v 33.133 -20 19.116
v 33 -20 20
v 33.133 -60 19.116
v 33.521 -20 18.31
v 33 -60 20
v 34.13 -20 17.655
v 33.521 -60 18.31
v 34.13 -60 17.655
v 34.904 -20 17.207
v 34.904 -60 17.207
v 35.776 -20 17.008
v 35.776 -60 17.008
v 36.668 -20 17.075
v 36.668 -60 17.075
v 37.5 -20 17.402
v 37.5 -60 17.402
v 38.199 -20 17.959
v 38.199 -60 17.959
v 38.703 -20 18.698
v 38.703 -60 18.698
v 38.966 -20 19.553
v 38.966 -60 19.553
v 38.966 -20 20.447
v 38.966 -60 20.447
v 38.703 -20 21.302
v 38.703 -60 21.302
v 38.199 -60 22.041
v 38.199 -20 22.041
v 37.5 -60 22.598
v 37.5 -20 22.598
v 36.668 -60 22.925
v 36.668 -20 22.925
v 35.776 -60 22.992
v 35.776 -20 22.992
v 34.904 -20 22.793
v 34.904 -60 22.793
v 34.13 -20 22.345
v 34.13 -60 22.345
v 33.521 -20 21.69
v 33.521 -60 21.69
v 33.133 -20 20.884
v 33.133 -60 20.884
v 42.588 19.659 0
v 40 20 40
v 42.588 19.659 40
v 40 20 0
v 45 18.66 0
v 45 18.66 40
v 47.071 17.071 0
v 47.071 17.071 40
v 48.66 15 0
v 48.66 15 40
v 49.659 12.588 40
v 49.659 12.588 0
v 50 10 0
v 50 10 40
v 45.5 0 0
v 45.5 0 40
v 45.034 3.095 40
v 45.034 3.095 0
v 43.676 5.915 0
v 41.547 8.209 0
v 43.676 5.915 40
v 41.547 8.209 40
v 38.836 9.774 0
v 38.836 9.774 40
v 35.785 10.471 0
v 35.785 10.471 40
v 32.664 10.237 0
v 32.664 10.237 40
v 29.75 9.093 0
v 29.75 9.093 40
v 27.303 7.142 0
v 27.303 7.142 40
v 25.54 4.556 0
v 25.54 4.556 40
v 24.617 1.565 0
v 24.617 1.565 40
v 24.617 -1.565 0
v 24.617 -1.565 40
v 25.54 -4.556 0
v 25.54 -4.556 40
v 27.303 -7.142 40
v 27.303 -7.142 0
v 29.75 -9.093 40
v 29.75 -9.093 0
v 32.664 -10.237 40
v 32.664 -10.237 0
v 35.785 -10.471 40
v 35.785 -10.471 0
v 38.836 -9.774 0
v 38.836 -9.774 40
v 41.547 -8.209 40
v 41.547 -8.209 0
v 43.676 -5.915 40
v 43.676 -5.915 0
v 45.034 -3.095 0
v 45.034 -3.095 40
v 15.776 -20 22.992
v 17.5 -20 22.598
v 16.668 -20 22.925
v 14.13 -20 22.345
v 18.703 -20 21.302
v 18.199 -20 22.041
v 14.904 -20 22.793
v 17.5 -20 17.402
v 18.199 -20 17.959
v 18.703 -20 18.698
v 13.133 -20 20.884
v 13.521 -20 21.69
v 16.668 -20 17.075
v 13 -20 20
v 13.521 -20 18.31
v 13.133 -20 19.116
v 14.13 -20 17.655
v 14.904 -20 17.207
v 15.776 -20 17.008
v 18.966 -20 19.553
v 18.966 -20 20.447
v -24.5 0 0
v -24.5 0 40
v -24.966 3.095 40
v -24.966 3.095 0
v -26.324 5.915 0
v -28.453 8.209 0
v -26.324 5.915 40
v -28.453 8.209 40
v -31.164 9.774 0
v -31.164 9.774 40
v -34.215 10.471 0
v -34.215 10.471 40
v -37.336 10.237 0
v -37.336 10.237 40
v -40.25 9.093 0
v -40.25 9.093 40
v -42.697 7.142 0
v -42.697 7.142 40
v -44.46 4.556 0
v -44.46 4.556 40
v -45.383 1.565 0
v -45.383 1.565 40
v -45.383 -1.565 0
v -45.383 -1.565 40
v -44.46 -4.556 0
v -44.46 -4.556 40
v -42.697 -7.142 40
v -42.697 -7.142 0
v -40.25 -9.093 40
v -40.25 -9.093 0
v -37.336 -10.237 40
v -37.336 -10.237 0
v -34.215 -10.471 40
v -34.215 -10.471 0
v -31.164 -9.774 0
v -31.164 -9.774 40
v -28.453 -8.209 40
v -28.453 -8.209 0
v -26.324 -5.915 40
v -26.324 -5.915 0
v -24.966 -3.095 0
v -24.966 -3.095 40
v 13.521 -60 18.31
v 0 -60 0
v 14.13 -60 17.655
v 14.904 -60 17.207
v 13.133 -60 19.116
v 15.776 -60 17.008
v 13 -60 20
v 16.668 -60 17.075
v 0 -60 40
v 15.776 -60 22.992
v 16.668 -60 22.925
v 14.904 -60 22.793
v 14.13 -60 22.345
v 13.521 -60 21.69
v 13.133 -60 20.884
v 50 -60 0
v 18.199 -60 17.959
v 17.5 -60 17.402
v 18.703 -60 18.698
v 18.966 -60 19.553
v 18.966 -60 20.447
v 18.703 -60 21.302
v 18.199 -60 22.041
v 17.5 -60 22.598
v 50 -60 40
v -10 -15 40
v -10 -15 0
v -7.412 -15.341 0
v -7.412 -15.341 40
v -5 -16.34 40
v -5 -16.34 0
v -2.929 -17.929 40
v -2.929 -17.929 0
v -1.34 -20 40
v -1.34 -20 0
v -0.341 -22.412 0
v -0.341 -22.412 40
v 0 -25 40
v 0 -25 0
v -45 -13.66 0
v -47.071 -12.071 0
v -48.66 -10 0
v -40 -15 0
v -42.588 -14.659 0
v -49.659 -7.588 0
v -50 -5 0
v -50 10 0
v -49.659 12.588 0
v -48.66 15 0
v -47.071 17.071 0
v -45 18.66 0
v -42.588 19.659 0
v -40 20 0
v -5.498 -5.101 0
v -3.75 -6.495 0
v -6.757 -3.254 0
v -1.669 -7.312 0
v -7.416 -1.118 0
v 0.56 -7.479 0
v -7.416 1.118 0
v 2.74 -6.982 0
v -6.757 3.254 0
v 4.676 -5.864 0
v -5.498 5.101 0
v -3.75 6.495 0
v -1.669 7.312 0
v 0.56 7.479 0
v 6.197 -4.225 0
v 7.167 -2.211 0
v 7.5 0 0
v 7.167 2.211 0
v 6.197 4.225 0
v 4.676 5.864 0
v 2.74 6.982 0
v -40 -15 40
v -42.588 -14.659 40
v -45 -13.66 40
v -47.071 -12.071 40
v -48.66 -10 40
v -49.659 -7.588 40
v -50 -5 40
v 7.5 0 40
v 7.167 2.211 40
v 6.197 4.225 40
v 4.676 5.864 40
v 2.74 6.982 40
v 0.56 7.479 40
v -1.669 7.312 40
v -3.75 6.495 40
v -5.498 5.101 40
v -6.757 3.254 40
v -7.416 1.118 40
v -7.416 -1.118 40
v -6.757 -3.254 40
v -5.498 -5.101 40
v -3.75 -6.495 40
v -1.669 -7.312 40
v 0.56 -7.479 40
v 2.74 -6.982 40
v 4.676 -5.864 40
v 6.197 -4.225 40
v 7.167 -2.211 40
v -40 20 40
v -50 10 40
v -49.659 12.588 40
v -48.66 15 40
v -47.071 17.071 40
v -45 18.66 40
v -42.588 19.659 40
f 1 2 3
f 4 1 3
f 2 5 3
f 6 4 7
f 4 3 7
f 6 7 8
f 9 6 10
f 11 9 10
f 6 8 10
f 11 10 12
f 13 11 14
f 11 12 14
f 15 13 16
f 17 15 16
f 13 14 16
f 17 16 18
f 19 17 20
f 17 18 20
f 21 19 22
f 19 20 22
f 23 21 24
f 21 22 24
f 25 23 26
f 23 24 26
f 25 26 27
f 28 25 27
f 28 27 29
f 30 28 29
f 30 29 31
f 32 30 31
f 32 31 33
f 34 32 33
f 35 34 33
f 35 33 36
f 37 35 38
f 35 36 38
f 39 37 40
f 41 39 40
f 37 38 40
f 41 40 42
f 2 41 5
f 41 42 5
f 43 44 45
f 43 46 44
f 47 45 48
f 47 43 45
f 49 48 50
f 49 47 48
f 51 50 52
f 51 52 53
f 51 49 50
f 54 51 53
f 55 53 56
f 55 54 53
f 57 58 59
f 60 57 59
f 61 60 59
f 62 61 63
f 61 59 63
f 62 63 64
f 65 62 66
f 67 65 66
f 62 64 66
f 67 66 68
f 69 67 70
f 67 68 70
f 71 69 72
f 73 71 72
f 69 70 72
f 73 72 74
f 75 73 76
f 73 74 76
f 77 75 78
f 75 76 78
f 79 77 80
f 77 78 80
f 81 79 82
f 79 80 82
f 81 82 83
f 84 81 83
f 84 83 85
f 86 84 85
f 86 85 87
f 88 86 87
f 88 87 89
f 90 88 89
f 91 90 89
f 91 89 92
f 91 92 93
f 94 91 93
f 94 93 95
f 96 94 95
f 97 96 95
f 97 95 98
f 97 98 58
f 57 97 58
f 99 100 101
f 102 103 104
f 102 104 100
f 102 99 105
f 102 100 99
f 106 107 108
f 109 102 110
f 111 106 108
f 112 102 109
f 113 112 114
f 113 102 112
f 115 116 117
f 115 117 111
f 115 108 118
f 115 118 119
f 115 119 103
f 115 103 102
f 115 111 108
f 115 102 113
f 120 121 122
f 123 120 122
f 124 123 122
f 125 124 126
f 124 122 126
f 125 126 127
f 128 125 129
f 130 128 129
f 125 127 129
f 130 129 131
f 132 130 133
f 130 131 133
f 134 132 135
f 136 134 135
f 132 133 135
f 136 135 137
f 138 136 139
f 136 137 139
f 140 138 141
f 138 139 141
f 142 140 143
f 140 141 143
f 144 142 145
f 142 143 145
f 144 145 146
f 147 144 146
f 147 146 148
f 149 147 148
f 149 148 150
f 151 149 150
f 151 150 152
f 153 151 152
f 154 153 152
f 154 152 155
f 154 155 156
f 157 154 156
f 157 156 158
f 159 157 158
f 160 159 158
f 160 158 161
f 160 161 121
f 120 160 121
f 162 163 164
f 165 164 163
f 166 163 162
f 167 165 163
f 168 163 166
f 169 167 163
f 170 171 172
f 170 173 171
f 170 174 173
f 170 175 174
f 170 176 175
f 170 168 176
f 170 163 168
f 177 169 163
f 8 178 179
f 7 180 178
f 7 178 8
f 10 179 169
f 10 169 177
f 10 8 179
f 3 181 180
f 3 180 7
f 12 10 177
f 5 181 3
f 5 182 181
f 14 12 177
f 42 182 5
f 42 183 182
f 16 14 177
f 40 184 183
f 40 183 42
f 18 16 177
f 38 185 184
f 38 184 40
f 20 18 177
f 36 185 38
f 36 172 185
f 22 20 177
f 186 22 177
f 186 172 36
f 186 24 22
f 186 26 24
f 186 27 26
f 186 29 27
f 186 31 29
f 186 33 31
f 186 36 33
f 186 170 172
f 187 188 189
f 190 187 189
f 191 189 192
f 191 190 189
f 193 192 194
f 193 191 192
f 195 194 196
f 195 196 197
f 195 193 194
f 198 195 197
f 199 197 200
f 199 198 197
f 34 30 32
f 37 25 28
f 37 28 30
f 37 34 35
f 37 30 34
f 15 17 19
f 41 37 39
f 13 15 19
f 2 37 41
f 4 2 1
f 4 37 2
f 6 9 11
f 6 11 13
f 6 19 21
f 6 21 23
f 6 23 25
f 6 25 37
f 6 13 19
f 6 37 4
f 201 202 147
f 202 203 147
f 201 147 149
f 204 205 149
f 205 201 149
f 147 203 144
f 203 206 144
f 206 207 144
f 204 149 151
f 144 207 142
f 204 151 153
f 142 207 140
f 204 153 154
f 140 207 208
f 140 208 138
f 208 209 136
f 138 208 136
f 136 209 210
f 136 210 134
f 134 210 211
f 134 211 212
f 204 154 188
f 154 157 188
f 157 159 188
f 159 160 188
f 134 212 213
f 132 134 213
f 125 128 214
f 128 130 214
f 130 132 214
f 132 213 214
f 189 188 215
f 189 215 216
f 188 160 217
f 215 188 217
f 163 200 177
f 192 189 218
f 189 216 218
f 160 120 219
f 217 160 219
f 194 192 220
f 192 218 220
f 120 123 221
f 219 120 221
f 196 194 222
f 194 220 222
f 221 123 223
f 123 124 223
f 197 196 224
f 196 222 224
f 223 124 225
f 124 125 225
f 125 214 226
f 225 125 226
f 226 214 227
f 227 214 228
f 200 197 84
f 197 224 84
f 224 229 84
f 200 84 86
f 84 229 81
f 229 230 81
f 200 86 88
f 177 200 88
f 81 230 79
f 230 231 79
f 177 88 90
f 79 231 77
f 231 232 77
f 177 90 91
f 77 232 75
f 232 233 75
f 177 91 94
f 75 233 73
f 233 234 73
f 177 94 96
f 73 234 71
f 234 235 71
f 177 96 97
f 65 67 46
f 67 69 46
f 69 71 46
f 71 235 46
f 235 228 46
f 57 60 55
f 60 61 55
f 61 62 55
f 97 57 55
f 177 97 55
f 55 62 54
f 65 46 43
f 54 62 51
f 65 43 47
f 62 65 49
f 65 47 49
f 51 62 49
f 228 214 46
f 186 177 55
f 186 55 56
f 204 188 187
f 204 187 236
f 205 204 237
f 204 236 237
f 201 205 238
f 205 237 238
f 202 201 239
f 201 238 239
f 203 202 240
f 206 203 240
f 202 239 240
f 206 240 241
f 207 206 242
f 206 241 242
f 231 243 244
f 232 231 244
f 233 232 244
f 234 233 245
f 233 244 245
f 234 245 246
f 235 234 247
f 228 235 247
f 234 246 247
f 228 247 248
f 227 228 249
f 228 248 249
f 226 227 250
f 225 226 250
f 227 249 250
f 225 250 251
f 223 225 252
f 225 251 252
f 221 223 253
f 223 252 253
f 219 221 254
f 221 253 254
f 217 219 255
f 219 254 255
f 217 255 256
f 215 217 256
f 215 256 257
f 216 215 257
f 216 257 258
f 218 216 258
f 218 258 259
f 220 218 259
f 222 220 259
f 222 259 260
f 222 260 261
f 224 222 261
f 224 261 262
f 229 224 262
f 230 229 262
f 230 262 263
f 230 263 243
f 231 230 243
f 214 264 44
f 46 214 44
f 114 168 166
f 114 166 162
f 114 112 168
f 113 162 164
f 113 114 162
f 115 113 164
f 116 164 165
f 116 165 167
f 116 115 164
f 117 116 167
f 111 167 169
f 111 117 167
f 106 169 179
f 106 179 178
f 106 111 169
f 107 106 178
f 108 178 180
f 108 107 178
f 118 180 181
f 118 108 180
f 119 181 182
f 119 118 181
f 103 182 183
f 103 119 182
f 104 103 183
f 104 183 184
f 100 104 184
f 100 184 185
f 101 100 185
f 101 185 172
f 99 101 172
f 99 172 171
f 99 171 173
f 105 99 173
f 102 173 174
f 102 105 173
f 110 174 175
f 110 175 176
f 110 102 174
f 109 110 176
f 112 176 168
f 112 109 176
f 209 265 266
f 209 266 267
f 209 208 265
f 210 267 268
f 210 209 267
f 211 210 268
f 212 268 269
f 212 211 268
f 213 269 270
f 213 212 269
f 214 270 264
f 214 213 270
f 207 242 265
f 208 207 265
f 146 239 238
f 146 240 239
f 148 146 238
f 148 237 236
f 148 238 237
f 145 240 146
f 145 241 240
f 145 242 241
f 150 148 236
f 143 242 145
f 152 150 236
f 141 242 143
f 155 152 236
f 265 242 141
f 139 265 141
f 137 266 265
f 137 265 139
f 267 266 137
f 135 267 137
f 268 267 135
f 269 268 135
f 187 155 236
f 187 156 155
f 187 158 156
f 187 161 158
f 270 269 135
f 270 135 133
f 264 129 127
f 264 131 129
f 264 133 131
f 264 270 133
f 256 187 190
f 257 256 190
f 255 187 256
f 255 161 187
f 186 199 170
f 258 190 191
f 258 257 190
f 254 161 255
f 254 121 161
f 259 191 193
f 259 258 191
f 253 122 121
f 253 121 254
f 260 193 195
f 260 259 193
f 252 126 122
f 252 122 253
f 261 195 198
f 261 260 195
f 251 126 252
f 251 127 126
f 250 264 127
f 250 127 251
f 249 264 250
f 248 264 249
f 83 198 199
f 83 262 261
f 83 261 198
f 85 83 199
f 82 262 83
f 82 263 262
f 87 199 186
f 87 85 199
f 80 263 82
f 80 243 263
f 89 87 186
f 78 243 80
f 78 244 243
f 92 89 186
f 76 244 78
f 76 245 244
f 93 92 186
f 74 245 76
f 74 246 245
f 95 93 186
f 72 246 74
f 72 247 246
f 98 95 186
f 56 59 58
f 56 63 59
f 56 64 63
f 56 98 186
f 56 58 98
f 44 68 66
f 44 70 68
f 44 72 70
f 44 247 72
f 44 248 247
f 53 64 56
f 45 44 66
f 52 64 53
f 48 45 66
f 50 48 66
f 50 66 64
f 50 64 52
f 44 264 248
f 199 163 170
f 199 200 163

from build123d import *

# Parameters (mm, degrees)
SKETCH1_W           = 100
SKETCH1_H           = 80
BOSS_EXTRUDE1_DEPTH = 40
CUT_EXTRUDE1_REACH  = 77.498
SKETCH2_R           = 7.5
SKETCH2_R_2         = 10.5
CUT_EXTRUDE2_REACH  = 77.498
SKETCH3_W           = 100
SKETCH3_H           = 20
CUT_EXTRUDE4_REACH  = 77.498
SKETCH5_W           = 50
SKETCH5_H           = 25
FILLET1_R           = 10
FILLET2_R           = 10
FILLET3_R           = 10
FILLET4_R           = 10
SKETCH6_W           = 50
SKETCH6_H           = 40
BOSS_EXTRUDE2_DEPTH = 20
SKETCH4_R           = 3
CUT_EXTRUDE5_DEPTH  = 20


with BuildPart() as part:
    # Sketch1 → Boss-Extrude1 (new body)
    with BuildSketch(Plane.XY):
        Rectangle(SKETCH1_W, SKETCH1_H)
    extrude(amount=BOSS_EXTRUDE1_DEPTH)

    # Sketch2 → Cut-Extrude1 (cut, up to next)
    with BuildSketch(Plane.XY.offset(40), mode=Mode.PRIVATE) as cut_extrude1_sk1:
        Circle(SKETCH2_R)
    cut_extrude1_tool1 = extrude(cut_extrude1_sk1.sketch, amount=-CUT_EXTRUDE1_REACH, mode=Mode.PRIVATE) & part.part
    # Sketch2 → Cut-Extrude1 (cut, up to next)
    with BuildSketch(Plane.XY.offset(40), mode=Mode.PRIVATE) as cut_extrude1_sk2:
        with Locations((-35, 0)):
            Circle(SKETCH2_R_2)
    cut_extrude1_tool2 = extrude(cut_extrude1_sk2.sketch, amount=-CUT_EXTRUDE1_REACH, mode=Mode.PRIVATE) & part.part
    # Sketch2 → Cut-Extrude1 (cut, up to next)
    with BuildSketch(Plane.XY.offset(40), mode=Mode.PRIVATE) as cut_extrude1_sk3:
        with Locations((35, 0)):
            Circle(SKETCH2_R_2)
    cut_extrude1_tool3 = extrude(cut_extrude1_sk3.sketch, amount=-CUT_EXTRUDE1_REACH, mode=Mode.PRIVATE) & part.part
    add(cut_extrude1_tool1.solids().sort_by_distance((0, 0, 40))[0], mode=Mode.SUBTRACT)
    add(cut_extrude1_tool2.solids().sort_by_distance((-35, 0, 40))[0], mode=Mode.SUBTRACT)
    add(cut_extrude1_tool3.solids().sort_by_distance((35, 0, 40))[0], mode=Mode.SUBTRACT)

    # Sketch3 → Cut-Extrude2 (cut, up to next)
    with BuildSketch(Plane.XY.offset(40), mode=Mode.PRIVATE) as cut_extrude2_sk1:
        with Locations((0, 30)):
            Rectangle(SKETCH3_W, SKETCH3_H)
    cut_extrude2_tool1 = extrude(cut_extrude2_sk1.sketch, amount=-CUT_EXTRUDE2_REACH, mode=Mode.PRIVATE) & part.part
    add(cut_extrude2_tool1.solids().sort_by_distance((0, 30, 40))[0], mode=Mode.SUBTRACT)

    # Sketch5 → Cut-Extrude4 (cut, up to next)
    with BuildSketch(Plane(origin=(0, 0, 0), x_dir=(-1, 0, 0), z_dir=(0, 0, -1)), mode=Mode.PRIVATE) as cut_extrude4_sk1:
        with Locations((25, -27.5)):
            Rectangle(SKETCH5_W, SKETCH5_H)
    cut_extrude4_tool1 = extrude(cut_extrude4_sk1.sketch, amount=-CUT_EXTRUDE4_REACH, mode=Mode.PRIVATE) & part.part
    add(cut_extrude4_tool1.solids().sort_by_distance((-25, -27.5, 0))[0], mode=Mode.SUBTRACT)

    # Fillet1
    fillet1_edges = [part.edges().sort_by_distance(p)[0] for p in [
        (0, -15, 20),
    ]]
    fillet(fillet1_edges, radius=FILLET1_R)

    # Fillet2
    fillet2_edges = [part.edges().sort_by_distance(p)[0] for p in [
        (-50, -15, 20),
    ]]
    fillet(fillet2_edges, radius=FILLET2_R)

    # Fillet3
    fillet3_edges = [part.edges().sort_by_distance(p)[0] for p in [
        (-50, 20, 20),
    ]]
    fillet(fillet3_edges, radius=FILLET3_R)

    # Fillet4
    fillet4_edges = [part.edges().sort_by_distance(p)[0] for p in [
        (50, 20, 20),
    ]]
    fillet(fillet4_edges, radius=FILLET4_R)

    # Sketch6 → Boss-Extrude2 (add)
    with BuildSketch(Plane.XZ.offset(40)):
        with Locations((25, 20)):
            Rectangle(SKETCH6_W, SKETCH6_H)
    extrude(amount=BOSS_EXTRUDE2_DEPTH)

    # Sketch4 → Cut-Extrude5 (cut, symmetric)
    with BuildSketch(Plane.XZ.offset(40)):
        with Locations(Location((16, 20, 0), (0, 0, 180))):
            Circle(SKETCH4_R)
        with Locations(Location((36, 20, 0), (0, 0, 180))):
            Circle(SKETCH4_R)
    extrude(amount=CUT_EXTRUDE5_DEPTH, both=True, mode=Mode.SUBTRACT)


solid = part.part
